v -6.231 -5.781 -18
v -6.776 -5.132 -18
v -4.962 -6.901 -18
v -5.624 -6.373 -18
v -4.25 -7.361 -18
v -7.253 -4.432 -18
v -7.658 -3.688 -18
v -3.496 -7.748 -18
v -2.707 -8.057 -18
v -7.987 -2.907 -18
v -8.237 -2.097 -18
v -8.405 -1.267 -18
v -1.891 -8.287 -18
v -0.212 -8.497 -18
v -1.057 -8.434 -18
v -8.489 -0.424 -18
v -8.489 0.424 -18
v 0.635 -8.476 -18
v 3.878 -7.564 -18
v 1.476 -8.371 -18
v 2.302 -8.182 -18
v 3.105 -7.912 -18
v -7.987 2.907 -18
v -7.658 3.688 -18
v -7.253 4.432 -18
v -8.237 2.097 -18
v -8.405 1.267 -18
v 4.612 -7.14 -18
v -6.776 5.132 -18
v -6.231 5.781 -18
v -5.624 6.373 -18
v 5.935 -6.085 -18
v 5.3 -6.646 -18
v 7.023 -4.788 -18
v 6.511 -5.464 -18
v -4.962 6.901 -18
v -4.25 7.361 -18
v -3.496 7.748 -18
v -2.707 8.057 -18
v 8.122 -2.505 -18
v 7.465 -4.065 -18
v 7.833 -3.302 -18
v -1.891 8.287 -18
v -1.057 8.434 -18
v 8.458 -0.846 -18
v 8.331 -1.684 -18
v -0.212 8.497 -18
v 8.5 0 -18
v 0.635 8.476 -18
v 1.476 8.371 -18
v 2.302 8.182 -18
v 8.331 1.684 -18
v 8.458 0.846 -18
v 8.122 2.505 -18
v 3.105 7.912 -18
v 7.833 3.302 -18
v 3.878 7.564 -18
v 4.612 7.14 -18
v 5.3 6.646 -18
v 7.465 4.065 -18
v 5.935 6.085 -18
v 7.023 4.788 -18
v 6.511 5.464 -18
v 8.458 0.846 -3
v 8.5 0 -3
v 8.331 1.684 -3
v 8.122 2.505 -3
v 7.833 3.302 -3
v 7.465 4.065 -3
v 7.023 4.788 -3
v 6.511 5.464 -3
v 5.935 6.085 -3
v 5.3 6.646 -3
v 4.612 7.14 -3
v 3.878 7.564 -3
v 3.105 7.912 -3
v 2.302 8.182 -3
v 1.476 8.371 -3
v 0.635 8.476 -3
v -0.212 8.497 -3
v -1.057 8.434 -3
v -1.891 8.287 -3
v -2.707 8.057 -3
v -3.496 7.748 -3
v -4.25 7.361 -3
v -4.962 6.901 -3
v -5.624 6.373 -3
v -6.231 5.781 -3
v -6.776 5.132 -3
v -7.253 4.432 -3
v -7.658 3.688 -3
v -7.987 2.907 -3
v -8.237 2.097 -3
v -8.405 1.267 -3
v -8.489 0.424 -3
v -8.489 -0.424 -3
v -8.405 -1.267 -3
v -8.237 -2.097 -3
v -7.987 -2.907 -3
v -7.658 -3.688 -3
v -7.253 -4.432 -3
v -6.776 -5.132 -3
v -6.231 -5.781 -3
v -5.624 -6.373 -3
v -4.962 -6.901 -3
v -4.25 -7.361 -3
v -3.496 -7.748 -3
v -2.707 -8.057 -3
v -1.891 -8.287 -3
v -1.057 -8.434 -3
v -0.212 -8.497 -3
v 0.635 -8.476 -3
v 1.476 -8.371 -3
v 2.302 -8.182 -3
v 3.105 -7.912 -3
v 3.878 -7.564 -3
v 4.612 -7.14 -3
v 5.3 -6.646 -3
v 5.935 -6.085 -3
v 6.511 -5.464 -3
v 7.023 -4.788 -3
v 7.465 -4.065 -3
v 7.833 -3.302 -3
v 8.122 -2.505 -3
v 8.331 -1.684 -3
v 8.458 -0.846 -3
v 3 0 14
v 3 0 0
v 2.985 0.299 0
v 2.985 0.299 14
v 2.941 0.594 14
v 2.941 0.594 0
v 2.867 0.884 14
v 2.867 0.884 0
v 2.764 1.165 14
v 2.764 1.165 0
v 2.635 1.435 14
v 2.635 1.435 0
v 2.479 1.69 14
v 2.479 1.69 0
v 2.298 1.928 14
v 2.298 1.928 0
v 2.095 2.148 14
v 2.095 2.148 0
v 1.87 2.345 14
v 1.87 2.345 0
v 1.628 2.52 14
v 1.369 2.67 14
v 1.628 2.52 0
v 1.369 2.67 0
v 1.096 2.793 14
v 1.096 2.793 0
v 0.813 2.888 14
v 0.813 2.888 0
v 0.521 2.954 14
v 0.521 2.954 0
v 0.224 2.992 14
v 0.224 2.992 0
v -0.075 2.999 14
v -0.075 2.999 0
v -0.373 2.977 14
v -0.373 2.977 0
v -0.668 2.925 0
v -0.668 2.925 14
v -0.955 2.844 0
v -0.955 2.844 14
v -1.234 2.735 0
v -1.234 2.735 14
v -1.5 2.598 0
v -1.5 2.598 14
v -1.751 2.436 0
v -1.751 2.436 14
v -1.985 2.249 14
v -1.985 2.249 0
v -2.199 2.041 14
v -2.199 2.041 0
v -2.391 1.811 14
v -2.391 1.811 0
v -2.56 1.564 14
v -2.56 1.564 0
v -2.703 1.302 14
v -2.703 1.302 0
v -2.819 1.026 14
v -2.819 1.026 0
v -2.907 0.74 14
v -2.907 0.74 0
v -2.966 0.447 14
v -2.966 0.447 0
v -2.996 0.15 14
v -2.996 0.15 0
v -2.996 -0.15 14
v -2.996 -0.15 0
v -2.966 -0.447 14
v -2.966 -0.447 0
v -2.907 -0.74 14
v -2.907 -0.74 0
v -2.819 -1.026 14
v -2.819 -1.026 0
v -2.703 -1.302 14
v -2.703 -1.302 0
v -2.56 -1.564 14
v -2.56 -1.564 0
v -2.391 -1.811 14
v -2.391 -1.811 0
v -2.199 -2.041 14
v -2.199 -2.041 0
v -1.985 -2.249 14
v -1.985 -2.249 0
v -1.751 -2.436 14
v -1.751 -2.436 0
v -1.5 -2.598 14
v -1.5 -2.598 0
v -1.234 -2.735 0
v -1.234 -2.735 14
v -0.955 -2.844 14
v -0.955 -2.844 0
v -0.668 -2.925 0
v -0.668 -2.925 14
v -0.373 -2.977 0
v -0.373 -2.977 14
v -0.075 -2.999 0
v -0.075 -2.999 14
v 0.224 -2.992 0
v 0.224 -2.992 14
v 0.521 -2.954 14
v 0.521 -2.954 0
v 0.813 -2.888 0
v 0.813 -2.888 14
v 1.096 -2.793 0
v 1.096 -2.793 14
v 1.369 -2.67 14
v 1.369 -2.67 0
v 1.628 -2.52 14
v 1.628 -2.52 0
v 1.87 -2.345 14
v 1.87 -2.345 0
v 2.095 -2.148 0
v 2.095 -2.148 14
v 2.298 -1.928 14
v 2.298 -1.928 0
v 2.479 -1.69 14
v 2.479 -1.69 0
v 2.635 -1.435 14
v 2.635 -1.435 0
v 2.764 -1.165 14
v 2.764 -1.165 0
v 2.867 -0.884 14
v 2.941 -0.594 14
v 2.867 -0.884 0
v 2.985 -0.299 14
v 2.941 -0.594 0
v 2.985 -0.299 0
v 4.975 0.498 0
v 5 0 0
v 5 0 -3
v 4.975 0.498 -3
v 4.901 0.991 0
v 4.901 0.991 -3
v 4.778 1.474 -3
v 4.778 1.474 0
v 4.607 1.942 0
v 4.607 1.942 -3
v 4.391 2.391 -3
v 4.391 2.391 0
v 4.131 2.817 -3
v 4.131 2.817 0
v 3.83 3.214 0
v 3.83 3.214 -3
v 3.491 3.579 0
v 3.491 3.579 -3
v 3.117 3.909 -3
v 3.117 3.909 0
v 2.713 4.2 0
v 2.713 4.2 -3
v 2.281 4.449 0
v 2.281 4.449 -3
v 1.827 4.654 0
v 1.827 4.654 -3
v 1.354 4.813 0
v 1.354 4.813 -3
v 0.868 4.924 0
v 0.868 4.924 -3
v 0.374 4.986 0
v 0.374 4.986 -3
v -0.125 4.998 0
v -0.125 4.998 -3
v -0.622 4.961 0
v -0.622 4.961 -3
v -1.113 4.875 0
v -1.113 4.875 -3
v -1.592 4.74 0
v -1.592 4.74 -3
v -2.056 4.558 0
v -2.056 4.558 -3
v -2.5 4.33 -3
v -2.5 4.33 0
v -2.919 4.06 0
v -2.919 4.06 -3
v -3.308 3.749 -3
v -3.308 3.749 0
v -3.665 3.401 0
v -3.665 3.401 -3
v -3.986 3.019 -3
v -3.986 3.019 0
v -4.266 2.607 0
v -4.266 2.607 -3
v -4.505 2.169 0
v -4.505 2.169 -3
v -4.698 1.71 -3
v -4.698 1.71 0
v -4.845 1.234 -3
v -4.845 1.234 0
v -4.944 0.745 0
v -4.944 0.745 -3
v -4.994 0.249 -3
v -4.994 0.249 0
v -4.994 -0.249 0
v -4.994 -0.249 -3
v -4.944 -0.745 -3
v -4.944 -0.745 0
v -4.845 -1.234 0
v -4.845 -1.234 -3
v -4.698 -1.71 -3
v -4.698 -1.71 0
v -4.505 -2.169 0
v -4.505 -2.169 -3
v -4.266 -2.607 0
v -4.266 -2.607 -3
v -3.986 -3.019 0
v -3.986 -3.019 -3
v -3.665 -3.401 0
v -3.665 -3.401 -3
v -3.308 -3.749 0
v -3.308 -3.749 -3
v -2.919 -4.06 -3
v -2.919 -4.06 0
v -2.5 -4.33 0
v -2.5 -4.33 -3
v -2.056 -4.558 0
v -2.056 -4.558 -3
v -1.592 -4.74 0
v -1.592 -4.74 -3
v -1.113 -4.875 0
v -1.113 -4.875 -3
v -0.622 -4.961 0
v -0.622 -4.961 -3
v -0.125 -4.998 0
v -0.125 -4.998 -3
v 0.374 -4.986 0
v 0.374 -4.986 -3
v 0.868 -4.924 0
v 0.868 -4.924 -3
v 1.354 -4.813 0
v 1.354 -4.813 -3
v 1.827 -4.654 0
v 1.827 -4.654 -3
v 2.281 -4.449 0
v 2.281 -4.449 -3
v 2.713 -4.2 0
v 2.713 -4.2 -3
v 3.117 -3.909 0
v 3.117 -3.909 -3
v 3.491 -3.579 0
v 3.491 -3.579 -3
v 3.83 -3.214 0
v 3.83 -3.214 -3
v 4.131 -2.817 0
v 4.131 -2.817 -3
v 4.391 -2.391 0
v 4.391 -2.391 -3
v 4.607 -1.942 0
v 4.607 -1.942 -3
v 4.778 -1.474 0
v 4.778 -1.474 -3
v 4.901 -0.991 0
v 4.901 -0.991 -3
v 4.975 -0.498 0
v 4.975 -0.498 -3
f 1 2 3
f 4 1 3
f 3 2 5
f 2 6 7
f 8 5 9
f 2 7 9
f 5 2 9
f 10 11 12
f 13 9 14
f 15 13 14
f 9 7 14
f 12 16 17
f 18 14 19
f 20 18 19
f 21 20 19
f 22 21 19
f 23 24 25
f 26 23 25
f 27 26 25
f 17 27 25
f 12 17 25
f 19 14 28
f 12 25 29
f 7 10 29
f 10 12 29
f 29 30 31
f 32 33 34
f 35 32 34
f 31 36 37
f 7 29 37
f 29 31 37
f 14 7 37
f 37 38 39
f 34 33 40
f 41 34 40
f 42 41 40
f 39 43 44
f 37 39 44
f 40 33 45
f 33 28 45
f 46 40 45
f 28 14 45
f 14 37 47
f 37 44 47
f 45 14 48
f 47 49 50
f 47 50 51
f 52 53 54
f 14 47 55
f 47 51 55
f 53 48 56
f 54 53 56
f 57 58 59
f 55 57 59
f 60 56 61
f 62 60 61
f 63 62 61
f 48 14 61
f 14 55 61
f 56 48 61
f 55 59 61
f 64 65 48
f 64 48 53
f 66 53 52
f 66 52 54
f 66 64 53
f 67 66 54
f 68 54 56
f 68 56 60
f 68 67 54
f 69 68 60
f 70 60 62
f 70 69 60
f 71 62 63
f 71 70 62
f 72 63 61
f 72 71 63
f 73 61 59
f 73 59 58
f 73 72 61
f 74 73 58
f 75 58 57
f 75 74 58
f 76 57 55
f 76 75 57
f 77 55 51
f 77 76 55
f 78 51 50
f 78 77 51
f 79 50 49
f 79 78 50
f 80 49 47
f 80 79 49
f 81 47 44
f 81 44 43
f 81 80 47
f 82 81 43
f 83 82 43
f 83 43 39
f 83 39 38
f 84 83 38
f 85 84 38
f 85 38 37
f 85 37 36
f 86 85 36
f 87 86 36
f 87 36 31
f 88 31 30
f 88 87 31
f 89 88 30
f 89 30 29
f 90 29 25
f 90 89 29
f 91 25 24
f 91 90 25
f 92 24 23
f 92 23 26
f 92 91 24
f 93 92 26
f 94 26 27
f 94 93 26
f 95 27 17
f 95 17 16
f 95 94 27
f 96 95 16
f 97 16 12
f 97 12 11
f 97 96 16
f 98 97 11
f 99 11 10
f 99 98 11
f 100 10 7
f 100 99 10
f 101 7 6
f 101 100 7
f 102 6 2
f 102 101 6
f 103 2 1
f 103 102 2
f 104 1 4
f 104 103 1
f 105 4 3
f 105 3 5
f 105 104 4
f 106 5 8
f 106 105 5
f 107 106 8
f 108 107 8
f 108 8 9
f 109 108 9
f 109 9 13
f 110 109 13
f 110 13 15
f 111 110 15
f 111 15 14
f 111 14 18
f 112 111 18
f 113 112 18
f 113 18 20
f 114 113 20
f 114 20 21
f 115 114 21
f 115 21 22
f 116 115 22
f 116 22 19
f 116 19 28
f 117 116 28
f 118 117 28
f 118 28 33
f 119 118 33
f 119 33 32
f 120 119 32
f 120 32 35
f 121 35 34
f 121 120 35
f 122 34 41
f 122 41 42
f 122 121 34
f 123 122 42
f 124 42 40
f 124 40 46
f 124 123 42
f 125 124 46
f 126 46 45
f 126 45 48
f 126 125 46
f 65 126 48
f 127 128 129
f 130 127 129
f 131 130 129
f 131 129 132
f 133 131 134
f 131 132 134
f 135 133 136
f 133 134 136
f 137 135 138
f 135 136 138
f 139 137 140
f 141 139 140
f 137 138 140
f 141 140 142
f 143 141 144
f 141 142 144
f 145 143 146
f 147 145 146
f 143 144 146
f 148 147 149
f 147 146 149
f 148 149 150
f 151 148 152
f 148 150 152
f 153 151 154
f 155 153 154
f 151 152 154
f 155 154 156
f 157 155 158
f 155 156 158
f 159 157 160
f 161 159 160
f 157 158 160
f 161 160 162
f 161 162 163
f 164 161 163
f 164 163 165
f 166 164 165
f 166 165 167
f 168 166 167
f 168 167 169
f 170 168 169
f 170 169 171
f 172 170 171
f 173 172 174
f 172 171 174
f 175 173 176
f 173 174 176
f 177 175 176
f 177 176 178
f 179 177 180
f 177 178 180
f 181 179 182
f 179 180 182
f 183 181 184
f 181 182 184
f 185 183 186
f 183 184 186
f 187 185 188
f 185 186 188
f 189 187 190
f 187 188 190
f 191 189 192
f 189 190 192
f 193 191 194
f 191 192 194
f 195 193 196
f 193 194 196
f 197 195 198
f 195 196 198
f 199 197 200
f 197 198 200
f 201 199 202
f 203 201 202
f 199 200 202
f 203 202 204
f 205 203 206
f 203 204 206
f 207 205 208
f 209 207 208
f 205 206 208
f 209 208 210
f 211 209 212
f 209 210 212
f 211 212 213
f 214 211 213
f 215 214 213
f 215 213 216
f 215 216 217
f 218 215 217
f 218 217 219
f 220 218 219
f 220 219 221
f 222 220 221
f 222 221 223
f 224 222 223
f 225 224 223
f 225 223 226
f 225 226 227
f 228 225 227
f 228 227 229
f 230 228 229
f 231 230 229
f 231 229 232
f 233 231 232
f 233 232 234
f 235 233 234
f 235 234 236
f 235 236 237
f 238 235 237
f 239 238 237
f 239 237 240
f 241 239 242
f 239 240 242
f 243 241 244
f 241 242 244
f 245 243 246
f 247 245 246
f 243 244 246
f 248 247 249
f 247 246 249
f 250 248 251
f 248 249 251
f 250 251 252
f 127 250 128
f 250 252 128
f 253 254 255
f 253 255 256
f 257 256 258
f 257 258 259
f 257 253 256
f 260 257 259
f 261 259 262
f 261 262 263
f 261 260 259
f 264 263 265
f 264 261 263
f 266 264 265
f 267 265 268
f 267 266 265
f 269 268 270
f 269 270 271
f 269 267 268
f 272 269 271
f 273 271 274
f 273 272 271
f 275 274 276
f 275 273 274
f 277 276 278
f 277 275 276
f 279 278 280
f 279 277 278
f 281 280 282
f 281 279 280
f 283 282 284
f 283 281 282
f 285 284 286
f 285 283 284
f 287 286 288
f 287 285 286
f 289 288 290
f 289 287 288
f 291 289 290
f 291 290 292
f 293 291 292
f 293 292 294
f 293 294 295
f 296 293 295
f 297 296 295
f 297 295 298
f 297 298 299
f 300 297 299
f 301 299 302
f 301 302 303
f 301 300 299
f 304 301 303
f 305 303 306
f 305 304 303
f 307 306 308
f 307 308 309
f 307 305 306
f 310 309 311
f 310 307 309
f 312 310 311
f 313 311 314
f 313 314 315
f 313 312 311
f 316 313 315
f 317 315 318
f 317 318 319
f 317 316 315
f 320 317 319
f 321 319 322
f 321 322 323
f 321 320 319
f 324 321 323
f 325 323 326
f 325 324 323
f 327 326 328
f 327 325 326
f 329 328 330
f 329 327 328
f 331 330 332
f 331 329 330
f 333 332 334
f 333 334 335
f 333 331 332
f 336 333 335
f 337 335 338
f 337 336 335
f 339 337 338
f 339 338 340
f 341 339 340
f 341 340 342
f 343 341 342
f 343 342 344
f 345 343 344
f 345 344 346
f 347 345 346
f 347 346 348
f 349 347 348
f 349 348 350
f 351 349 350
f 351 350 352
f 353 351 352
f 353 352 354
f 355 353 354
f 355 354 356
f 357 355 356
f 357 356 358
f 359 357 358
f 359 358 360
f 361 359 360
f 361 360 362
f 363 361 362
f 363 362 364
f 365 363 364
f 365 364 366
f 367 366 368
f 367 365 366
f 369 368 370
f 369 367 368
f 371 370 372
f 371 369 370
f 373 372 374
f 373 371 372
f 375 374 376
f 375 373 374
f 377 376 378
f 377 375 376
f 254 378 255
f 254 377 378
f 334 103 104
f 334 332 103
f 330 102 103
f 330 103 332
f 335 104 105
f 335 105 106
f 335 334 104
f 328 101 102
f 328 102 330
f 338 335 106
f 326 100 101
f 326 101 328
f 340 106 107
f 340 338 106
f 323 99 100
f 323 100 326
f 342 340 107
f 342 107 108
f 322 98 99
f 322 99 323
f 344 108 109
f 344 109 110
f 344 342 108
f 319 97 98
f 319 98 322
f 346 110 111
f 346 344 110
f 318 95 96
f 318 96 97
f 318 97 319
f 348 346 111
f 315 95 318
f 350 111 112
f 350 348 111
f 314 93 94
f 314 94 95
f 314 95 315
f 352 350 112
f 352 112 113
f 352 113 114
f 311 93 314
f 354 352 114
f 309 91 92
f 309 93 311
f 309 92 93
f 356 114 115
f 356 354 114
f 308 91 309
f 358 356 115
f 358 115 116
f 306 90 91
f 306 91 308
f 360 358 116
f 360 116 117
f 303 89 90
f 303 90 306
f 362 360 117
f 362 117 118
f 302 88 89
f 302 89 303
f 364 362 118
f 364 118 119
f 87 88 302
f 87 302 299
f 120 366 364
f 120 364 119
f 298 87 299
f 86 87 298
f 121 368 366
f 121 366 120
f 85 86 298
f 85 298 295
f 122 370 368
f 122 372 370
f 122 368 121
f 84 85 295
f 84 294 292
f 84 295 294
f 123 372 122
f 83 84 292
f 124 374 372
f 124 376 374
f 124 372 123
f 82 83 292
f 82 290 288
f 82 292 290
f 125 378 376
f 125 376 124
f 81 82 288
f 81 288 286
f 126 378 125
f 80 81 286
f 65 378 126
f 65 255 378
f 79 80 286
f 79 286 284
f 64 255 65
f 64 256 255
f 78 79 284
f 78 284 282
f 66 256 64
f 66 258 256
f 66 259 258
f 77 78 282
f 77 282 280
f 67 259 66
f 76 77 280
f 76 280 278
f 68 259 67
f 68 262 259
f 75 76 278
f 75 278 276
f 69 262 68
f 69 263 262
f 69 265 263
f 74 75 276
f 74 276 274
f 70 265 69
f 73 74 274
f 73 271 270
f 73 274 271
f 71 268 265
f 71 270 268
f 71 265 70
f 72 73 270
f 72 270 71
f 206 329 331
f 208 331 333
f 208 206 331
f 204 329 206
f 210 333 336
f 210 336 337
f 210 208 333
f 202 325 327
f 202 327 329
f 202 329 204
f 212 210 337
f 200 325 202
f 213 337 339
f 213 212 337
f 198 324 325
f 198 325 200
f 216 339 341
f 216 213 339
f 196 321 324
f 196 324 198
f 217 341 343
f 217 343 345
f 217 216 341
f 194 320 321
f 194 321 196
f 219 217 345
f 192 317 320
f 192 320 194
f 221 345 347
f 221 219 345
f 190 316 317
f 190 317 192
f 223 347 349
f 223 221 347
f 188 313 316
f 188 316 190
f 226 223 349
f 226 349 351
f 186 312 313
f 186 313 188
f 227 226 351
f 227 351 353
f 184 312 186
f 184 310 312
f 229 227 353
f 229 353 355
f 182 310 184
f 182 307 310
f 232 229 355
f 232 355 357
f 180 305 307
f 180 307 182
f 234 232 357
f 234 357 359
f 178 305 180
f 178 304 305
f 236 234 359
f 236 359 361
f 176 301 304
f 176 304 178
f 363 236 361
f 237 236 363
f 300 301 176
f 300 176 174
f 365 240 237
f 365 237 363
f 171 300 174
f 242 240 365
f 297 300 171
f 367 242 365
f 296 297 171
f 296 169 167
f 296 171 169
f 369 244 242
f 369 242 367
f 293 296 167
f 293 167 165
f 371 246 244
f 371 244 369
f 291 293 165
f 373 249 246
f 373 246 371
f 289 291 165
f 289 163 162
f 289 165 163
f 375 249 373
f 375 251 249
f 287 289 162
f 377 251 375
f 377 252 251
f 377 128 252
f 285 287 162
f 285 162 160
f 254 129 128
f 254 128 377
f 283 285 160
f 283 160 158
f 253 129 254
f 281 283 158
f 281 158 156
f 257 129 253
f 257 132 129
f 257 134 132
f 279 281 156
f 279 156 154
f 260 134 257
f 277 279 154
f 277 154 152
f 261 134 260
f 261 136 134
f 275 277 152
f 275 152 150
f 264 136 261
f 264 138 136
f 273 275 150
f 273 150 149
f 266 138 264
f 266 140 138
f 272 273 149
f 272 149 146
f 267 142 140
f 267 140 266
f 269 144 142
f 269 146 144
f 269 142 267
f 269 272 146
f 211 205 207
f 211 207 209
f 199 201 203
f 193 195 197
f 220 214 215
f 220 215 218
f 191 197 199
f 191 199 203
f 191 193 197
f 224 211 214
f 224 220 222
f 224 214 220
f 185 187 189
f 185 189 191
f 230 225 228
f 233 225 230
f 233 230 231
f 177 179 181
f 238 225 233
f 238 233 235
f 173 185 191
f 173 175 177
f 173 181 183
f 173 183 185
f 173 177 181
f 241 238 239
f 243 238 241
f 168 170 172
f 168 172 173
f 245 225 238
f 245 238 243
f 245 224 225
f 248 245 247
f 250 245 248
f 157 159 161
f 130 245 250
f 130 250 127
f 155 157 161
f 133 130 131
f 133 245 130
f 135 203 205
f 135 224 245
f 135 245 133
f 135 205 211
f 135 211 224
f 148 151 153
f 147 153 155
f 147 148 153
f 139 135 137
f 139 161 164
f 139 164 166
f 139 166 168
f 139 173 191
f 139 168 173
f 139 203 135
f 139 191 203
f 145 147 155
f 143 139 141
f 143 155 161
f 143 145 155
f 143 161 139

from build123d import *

# Parameters (mm, degrees)
SKETCH_1_R      = 3
EXTRUDE_1_DEPTH = 14
SKETCH_1_3_R    = 5
EXTRUDE_2_DEPTH = 3
EXTRUDE_START   = -3
SKETCH_1_4_R    = 8.5
EXTRUDE_3_DEPTH = 15


with BuildPart() as part:
    # 스케치1 → 보스-돌출1 (new body)
    with BuildSketch(Plane.XY):
        Circle(SKETCH_1_R)
    extrude(amount=EXTRUDE_1_DEPTH)

    # 스케치1<3> → 보스-돌출2 (add)
    with BuildSketch(Plane.XY):
        Circle(SKETCH_1_3_R)
    extrude(amount=-EXTRUDE_2_DEPTH)

    # 스케치1<4> → 보스-돌출3 (add)
    with BuildSketch(Plane.XY.offset(EXTRUDE_START)):
        Circle(SKETCH_1_4_R)
    extrude(amount=-EXTRUDE_3_DEPTH)


solid = part.part
